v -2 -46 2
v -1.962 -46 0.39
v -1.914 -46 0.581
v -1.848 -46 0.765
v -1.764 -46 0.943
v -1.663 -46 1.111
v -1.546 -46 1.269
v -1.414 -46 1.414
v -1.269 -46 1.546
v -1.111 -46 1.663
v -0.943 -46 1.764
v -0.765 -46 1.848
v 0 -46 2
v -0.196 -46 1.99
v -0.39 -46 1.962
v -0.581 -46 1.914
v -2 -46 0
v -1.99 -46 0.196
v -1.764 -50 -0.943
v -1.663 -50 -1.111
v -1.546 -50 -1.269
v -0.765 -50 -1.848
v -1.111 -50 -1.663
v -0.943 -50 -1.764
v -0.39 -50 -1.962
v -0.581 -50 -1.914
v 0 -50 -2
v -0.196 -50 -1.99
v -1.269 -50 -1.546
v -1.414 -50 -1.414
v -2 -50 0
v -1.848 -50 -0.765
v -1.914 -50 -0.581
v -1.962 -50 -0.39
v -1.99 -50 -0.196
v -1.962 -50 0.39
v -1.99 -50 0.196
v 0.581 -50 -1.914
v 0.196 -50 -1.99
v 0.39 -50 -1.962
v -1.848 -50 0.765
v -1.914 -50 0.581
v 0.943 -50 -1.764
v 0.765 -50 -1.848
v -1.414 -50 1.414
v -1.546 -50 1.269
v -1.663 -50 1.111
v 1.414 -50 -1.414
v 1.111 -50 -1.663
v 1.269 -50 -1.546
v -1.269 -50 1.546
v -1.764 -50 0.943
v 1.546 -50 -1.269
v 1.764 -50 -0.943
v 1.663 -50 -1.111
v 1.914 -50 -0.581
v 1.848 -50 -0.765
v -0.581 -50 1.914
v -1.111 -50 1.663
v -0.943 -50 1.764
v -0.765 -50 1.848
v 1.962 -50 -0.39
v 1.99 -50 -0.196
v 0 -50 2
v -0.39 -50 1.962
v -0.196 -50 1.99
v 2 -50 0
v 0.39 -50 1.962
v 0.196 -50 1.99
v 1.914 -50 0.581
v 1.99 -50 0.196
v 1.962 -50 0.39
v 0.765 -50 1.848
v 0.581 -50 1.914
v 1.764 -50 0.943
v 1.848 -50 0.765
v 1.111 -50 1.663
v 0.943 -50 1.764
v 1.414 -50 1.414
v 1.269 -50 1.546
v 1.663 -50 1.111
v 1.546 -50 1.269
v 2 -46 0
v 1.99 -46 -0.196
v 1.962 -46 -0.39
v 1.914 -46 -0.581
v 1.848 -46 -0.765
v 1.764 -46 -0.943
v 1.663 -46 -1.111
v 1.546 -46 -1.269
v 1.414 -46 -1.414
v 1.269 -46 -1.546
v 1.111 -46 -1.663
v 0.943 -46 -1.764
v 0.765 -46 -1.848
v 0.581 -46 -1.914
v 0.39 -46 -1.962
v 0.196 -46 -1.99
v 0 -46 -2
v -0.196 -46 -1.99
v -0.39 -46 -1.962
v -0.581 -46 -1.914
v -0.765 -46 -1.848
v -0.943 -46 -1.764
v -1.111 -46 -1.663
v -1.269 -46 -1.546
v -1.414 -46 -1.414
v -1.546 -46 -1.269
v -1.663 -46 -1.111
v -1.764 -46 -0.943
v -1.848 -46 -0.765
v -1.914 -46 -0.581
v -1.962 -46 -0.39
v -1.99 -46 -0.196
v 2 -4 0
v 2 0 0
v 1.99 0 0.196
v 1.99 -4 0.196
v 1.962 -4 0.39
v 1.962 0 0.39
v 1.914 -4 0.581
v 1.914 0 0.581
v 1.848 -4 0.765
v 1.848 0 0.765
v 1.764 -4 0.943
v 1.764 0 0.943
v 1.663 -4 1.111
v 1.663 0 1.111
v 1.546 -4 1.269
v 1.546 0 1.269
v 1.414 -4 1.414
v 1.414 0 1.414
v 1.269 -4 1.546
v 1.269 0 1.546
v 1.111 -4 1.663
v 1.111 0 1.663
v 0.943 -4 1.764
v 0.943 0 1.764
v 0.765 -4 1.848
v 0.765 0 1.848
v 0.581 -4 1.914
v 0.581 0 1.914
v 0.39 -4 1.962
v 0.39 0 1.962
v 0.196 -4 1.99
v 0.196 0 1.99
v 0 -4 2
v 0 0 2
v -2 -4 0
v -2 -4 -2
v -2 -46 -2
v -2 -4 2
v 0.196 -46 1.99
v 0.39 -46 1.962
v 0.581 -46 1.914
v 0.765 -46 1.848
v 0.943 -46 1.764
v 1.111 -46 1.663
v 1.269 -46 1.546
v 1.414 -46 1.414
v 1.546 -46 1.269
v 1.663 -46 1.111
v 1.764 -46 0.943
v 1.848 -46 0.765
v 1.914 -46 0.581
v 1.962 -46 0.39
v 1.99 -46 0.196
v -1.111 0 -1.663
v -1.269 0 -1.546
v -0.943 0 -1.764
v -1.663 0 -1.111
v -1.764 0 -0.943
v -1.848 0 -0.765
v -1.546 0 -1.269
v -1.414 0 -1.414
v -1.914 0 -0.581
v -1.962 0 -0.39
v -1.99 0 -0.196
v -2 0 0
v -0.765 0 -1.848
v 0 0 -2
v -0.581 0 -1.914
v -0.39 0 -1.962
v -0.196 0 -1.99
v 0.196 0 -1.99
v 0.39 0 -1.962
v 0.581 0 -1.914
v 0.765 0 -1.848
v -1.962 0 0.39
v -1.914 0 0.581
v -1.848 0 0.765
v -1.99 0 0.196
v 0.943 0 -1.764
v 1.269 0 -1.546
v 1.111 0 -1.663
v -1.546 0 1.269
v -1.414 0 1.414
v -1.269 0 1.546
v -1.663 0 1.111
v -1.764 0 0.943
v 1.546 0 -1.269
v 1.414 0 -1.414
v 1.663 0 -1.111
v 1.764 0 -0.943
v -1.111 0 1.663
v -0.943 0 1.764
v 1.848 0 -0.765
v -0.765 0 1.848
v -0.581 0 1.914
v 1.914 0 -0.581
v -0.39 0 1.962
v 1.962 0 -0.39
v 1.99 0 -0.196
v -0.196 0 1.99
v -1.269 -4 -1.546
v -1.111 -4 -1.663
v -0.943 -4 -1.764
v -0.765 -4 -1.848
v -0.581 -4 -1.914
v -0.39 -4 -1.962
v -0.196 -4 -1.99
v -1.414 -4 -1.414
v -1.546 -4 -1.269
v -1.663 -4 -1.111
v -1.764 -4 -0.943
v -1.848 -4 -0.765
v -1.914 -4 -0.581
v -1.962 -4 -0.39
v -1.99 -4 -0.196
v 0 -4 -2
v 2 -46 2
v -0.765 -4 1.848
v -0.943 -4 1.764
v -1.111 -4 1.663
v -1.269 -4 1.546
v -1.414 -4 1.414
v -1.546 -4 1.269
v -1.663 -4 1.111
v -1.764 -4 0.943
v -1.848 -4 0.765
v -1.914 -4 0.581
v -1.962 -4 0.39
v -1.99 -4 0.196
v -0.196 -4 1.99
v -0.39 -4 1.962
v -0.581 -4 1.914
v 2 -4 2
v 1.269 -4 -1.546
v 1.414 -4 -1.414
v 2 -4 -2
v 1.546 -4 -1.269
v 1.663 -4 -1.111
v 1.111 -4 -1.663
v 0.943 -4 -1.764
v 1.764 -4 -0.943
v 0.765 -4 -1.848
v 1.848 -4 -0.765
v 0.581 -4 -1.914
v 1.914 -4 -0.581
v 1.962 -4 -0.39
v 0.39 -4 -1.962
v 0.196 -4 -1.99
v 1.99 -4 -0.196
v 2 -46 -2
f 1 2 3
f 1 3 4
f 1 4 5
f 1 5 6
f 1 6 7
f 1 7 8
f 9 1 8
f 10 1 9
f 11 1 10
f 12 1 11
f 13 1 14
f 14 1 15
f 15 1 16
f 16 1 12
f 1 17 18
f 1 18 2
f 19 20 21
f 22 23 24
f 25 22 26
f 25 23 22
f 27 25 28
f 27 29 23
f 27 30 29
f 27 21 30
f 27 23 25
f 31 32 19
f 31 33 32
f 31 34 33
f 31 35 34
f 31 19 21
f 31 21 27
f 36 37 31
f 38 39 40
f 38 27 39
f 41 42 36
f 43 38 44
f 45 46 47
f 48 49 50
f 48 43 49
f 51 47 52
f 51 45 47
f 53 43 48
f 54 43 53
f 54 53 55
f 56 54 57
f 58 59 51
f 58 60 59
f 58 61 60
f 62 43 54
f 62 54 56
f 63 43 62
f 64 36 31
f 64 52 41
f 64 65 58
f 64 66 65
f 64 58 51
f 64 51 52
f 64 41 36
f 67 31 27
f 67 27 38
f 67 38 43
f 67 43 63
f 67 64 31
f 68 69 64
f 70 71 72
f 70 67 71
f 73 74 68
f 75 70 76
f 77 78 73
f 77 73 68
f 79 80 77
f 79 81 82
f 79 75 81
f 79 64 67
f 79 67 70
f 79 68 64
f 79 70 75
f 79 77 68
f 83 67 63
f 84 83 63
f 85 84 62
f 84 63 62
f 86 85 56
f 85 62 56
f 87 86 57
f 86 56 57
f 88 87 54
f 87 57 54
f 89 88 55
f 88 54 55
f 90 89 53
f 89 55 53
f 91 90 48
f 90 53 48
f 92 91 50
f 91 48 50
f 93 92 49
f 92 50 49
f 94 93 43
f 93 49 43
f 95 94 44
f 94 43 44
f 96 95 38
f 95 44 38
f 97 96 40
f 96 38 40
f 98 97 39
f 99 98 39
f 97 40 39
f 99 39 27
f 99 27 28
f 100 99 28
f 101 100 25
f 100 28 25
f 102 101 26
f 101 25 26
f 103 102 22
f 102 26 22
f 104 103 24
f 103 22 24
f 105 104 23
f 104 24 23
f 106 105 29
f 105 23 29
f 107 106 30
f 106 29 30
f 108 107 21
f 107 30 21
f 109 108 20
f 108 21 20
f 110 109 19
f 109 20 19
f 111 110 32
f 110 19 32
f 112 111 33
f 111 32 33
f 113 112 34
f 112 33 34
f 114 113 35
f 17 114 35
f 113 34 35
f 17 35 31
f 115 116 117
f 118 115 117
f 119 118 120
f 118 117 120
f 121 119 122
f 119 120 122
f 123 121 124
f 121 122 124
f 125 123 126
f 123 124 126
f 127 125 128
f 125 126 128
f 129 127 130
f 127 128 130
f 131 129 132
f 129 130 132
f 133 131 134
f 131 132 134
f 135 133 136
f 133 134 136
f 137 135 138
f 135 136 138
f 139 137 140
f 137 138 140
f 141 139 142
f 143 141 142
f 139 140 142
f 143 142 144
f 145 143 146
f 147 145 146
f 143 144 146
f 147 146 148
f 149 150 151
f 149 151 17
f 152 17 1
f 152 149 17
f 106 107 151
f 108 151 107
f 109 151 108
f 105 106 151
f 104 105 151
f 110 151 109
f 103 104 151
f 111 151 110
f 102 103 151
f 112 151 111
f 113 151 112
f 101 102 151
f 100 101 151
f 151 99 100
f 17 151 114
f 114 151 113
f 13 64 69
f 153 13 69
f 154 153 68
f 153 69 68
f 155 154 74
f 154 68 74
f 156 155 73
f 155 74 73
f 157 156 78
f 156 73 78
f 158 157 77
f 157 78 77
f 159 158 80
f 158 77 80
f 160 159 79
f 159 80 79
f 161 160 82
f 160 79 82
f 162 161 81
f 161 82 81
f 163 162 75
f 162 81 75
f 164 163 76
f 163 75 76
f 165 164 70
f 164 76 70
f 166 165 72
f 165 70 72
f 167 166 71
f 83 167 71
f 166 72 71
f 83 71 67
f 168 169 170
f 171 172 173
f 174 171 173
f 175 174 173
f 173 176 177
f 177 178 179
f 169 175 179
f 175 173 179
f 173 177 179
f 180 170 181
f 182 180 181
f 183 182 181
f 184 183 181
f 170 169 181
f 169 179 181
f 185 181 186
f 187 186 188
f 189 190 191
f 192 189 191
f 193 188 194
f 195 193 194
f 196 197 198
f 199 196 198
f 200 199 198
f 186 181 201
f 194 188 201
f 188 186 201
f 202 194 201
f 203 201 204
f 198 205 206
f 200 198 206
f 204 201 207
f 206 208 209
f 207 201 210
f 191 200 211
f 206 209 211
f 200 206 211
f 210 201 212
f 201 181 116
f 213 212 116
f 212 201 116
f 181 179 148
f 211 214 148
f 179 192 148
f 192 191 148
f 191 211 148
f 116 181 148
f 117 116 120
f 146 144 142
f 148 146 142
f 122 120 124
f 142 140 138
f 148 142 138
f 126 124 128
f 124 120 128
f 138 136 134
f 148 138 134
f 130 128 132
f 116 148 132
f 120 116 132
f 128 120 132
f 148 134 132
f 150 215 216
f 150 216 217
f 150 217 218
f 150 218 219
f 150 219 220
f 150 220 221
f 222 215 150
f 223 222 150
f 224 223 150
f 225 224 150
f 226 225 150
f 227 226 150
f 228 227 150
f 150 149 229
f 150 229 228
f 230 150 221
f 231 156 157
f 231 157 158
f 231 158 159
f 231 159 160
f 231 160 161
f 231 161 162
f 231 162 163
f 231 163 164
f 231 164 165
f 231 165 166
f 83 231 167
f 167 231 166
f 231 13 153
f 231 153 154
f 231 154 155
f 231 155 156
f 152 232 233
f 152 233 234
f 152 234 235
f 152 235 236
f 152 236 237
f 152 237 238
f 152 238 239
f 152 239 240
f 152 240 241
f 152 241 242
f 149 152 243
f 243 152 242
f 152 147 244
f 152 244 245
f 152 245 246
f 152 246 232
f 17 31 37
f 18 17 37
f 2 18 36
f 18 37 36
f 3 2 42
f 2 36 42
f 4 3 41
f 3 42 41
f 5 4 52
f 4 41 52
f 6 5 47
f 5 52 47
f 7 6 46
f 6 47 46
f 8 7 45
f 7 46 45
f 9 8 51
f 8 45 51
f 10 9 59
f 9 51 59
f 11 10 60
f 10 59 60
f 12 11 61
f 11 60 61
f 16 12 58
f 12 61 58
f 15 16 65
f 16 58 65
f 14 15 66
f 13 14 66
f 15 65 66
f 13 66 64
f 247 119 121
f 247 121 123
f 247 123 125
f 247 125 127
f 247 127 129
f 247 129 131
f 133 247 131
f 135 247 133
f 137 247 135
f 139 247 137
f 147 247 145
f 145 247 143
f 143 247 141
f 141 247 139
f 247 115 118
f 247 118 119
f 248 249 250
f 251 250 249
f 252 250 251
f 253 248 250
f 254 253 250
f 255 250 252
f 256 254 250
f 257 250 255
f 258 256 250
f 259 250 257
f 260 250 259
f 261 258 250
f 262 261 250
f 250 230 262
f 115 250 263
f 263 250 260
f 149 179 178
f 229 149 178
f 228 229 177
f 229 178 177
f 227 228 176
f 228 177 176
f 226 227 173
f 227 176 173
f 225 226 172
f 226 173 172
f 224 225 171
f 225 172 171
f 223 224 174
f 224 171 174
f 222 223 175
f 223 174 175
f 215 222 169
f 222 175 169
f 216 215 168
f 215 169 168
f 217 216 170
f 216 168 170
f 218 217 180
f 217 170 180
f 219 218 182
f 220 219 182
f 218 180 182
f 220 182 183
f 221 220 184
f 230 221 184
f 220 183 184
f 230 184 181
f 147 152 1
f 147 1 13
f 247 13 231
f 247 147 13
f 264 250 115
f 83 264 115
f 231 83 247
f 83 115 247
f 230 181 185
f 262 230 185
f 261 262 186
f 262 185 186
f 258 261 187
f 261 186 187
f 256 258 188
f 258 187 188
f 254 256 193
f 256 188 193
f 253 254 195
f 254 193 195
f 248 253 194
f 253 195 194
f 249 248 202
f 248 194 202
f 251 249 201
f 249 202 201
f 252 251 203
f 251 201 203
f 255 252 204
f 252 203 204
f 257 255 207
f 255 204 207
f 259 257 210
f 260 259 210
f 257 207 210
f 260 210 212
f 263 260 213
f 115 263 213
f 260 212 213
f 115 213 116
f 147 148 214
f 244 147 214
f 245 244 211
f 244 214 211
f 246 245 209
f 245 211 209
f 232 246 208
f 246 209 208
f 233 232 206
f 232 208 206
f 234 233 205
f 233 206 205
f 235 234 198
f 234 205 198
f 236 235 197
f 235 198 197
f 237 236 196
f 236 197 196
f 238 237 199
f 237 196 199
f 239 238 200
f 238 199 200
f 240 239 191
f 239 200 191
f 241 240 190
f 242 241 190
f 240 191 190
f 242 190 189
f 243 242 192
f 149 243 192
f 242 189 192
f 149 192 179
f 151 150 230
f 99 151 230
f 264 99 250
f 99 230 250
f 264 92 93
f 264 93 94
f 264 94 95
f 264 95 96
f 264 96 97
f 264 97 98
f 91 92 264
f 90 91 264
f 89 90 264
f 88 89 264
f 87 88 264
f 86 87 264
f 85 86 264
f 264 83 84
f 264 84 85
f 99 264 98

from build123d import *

# Parameters (mm, degrees)
F0_W     = 4
F0_H     = 4
F1_DEPTH = 50
F3_DEPTH = 4
F5_DEPTH = 4


with BuildPart() as f1:
    # F0 (on Front) → F1 (new body)
    with BuildSketch(Plane.XZ):
        Rectangle(F0_W, F0_H)
    extrude(amount=F1_DEPTH)

    # F2 (on face) → F3 (cut)
    with BuildSketch(Plane(origin=(0, 0, 0), x_dir=(-1, 0, 0), z_dir=(0, 1, 0))):
        with BuildLine():
            ThreePointArc((-2, 0), (-1.4142135624, 1.4142135624), (0, 2))
            Line((0, 2), (-2, 2))
            Line((-2, 2), (-2, 0))
        make_face()
        with BuildLine():
            Line((-2, -2), (0, -2))
            ThreePointArc((0, -2), (-1.4142135624, -1.4142135624), (-2, 0))
            Line((-2, 0), (-2, -2))
        make_face()
        with BuildLine():
            Line((2, -2), (2, 0))
            ThreePointArc((2, 0), (1.4142135624, -1.4142135624), (0, -2))
            Line((0, -2), (2, -2))
        make_face()
        with BuildLine():
            ThreePointArc((0, 2), (1.4142135624, 1.4142135624), (2, 0))
            Line((2, 0), (2, 2))
            Line((2, 2), (0, 2))
        make_face()
    extrude(amount=-F3_DEPTH, mode=Mode.SUBTRACT)

    # F4 (on face) → F5 (cut)
    with BuildSketch(Plane.XZ.offset(50)):
        with BuildLine():
            ThreePointArc((-2, 0), (-1.4142135624, 1.4142135624), (0, 2))
            Line((0, 2), (-2, 2))
            Line((-2, 2), (-2, 0))
        make_face()
        with BuildLine():
            Line((-2, -2), (0, -2))
            ThreePointArc((0, -2), (-1.4142135624, -1.4142135624), (-2, 0))
            Line((-2, 0), (-2, -2))
        make_face()
        with BuildLine():
            Line((2, -2), (2, 0))
            ThreePointArc((2, 0), (1.4142135624, -1.4142135624), (0, -2))
            Line((0, -2), (2, -2))
        make_face()
        with BuildLine():
            ThreePointArc((0, 2), (1.4142135624, 1.4142135624), (2, 0))
            Line((2, 0), (2, 2))
            Line((2, 2), (0, 2))
        make_face()
    extrude(amount=-F5_DEPTH, mode=Mode.SUBTRACT)


solid = f1.part
